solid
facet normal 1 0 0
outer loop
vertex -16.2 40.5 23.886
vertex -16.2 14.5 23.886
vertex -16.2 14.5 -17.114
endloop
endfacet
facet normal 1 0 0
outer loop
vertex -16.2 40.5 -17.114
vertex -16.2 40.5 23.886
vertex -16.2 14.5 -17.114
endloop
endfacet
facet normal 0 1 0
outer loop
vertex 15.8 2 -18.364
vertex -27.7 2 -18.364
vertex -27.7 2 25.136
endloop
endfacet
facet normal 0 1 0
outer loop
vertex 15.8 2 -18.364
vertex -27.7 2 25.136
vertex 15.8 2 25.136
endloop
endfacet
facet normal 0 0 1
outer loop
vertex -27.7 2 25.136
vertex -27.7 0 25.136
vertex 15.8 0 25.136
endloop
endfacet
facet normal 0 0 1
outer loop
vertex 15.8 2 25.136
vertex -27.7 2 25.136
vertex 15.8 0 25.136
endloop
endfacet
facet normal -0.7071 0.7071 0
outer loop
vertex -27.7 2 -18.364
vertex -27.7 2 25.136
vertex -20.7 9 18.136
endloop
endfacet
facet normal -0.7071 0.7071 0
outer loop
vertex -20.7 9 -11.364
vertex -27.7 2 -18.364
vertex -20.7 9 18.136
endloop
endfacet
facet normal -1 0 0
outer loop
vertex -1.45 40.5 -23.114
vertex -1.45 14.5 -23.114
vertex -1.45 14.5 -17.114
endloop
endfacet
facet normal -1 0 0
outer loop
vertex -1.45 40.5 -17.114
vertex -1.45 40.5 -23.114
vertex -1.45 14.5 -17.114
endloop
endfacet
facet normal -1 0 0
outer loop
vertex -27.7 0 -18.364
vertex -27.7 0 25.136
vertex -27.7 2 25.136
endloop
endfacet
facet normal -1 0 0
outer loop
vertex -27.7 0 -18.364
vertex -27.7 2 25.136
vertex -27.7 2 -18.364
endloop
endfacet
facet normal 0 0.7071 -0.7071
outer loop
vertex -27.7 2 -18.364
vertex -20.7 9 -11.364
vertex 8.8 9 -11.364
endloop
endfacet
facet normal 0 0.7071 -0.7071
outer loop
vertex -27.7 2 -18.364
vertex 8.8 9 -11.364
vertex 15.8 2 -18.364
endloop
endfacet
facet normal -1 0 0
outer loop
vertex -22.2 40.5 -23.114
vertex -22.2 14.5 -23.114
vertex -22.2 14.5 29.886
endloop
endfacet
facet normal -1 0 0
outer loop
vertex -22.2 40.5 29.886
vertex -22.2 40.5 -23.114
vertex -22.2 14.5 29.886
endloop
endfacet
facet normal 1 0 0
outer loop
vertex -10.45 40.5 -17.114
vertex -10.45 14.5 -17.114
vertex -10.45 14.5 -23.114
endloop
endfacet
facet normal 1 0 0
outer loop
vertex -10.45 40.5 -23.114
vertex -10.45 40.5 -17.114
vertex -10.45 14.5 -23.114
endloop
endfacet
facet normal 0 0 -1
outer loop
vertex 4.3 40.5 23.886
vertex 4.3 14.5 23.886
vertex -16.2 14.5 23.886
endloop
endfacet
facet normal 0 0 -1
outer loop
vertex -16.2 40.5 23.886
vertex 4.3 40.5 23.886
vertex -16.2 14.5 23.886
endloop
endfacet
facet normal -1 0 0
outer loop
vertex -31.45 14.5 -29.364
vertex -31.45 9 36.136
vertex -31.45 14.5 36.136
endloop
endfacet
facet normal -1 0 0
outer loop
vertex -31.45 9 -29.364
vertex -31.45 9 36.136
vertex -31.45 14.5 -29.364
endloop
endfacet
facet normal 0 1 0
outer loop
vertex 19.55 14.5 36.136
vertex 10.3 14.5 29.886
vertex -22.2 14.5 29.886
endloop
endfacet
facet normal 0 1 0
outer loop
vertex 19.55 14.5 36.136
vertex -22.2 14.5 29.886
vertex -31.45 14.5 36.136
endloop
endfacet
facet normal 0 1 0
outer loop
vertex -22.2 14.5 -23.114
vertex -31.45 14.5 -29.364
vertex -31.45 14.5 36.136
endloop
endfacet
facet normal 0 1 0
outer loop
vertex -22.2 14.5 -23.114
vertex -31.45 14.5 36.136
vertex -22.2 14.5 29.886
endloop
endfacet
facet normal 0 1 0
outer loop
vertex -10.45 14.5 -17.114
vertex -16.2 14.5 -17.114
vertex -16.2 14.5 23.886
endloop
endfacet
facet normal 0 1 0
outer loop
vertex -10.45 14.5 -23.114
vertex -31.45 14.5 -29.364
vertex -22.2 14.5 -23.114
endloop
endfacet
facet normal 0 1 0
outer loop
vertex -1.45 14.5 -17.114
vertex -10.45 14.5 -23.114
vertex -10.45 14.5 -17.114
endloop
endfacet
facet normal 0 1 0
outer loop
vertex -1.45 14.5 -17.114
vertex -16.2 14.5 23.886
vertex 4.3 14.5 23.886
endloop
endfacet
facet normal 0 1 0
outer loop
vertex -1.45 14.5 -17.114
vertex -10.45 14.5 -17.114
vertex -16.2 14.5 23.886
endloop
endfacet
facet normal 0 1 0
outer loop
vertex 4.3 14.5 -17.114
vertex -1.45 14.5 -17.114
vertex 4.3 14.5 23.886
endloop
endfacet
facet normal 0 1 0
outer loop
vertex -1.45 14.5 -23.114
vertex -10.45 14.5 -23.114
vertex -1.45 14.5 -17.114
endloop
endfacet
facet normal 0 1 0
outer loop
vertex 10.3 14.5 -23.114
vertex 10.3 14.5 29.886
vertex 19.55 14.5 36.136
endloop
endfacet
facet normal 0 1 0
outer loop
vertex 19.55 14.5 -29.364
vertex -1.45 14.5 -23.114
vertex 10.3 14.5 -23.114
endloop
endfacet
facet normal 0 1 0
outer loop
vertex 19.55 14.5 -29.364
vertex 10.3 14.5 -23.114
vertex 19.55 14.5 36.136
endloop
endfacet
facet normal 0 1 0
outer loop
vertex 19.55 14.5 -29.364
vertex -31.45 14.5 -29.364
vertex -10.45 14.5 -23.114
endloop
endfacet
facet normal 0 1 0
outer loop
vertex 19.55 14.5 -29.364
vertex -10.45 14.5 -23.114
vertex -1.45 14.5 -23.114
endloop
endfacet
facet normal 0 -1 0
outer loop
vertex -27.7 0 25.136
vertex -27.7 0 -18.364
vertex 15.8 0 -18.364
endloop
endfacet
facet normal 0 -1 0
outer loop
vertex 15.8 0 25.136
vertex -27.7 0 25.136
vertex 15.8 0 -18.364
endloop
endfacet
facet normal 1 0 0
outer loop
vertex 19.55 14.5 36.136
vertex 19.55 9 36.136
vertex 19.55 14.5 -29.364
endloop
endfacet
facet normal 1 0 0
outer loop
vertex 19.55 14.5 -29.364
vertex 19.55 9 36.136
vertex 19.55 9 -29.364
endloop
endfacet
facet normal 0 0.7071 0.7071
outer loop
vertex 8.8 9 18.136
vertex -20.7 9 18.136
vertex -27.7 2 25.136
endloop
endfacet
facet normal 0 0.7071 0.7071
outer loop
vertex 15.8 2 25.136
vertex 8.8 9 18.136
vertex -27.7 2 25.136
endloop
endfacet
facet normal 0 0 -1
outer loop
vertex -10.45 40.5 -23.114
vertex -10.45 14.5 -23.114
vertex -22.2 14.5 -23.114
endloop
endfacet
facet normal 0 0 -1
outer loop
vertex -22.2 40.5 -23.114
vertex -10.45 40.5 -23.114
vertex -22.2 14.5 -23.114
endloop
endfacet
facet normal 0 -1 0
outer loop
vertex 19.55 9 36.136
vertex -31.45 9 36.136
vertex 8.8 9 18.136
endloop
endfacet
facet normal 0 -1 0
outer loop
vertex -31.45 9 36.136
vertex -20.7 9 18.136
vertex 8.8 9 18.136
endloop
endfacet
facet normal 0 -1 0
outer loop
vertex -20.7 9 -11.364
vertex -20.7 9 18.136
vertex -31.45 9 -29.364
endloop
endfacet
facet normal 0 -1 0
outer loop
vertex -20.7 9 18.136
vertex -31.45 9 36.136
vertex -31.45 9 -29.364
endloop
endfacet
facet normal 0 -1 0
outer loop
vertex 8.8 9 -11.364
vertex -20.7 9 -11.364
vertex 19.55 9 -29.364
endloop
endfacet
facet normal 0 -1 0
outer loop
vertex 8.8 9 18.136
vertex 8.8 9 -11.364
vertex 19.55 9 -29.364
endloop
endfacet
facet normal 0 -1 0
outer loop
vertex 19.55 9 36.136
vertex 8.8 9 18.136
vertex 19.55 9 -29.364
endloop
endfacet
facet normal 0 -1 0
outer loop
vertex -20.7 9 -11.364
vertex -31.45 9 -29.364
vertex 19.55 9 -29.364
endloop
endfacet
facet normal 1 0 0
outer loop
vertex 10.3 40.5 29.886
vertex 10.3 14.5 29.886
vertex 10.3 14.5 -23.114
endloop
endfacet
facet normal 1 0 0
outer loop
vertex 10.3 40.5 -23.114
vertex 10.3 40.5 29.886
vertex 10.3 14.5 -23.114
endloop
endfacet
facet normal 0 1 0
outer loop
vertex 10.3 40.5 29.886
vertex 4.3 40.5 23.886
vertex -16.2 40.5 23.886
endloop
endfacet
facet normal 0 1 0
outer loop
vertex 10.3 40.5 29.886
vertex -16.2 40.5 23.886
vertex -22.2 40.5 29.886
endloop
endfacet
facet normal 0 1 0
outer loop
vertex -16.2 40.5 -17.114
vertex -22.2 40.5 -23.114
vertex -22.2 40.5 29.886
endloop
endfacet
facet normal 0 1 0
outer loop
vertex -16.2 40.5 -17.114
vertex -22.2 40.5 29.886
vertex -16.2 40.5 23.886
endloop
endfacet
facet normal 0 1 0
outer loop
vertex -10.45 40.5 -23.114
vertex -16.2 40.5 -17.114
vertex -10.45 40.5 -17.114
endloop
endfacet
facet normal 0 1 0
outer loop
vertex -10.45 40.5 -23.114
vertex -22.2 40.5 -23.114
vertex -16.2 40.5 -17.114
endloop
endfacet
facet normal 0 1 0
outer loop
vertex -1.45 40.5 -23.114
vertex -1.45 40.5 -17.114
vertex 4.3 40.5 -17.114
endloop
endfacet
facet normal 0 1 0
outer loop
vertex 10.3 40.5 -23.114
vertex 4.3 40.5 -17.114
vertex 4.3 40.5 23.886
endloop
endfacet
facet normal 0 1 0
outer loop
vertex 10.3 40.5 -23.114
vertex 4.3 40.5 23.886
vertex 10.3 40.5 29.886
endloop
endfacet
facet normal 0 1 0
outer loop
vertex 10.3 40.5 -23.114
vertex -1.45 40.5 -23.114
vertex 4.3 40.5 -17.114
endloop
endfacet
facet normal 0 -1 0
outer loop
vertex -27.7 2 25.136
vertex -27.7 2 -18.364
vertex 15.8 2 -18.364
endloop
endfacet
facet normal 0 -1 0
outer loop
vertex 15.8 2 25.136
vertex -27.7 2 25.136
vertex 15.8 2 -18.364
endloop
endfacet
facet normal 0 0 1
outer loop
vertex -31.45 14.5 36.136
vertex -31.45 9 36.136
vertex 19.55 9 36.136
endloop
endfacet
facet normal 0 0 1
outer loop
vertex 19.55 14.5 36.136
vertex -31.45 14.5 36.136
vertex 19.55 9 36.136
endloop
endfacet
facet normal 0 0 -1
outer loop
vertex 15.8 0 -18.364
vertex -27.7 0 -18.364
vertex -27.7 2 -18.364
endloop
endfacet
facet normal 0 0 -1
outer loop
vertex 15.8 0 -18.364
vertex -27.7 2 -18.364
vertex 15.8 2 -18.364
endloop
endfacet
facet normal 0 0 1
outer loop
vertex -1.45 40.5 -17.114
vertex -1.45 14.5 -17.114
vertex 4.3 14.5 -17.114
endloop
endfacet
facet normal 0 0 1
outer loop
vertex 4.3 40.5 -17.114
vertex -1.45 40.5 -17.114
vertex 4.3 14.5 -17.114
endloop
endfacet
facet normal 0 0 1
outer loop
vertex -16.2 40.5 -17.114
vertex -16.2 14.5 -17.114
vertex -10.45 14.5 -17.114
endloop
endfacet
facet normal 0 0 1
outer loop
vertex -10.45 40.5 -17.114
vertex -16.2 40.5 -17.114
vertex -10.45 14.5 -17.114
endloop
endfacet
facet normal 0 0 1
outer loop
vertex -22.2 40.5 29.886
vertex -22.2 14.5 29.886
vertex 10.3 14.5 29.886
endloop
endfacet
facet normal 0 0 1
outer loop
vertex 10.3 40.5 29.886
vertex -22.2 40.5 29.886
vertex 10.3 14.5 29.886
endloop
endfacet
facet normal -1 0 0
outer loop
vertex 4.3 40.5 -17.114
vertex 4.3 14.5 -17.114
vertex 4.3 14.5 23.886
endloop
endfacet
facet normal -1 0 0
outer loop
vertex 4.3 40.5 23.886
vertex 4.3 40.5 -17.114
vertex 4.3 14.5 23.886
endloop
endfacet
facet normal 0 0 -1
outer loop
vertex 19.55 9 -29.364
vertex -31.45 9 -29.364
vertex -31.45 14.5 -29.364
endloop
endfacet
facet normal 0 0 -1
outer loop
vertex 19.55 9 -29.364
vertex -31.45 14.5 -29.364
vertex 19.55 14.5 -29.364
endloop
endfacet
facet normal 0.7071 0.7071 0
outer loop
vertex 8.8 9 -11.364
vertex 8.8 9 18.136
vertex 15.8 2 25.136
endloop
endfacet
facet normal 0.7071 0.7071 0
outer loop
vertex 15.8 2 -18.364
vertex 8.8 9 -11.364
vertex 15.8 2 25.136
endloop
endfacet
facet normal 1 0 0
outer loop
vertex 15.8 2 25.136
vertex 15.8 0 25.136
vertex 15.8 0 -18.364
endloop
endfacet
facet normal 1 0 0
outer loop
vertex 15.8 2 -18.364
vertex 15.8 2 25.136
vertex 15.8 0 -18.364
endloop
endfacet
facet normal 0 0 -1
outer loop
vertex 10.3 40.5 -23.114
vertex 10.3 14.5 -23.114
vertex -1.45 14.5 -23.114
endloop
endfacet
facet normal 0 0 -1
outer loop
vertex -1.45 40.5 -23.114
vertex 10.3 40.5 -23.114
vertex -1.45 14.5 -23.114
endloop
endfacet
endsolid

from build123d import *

# Parameters (mm, degrees)
SKETCH1_W           = 43.5
SKETCH1_H           = 43.5
BOSS_EXTRUDE1_DEPTH = 2
SKETCH2_W           = 43.5
SKETCH2_H           = 43.5
BOSS_EXTRUDE3_DEPTH = 7
CUT_EXTRUDE1_DEPTH  = 53.350416735
CUT_EXTRUDE2_DEPTH  = 52.039681144
SKETCH7_W           = 51
SKETCH7_H           = 65.5
BOSS_EXTRUDE4_DEPTH = 5.5
BOSS_EXTRUDE5_DEPTH = 26


with BuildPart() as part:
    # Sketch1 → Boss-Extrude1 (new body)
    with BuildSketch(Plane(origin=(0, 0, 0), x_dir=(1, 0, 0), z_dir=(0, 1, 0))):
        with Locations((-5.950471698, -3.385613208)):
            Rectangle(SKETCH1_W, SKETCH1_H)
    extrude(amount=BOSS_EXTRUDE1_DEPTH)


with BuildPart() as body_2:
    # Sketch2 → Boss-Extrude3 (new body)
    with BuildSketch(Plane(origin=(0, 2, 0), x_dir=(1, 0, 0), z_dir=(0, 1, 0))):
        with Locations((-5.950471698, -3.385613208)):
            Rectangle(SKETCH2_W, SKETCH2_H)
    extrude(amount=BOSS_EXTRUDE3_DEPTH)

    # Sketch5 → Cut-Extrude1 (cut, through all)
    with BuildSketch(Plane.XY.offset(25.135613208)):
        Polygon((15.799528302, 9), (8.799528302, 9), (15.799528302, 2), align=None)
        Polygon((-27.700471698, 9), (-27.700471698, 2), (-20.700471698, 9), align=None)
    extrude(amount=-CUT_EXTRUDE1_DEPTH, mode=Mode.SUBTRACT)

    # Sketch6 → Cut-Extrude2 (cut, through all)
    with BuildSketch(Plane(origin=(15.799528302, 0, 0), x_dir=(0, 0, -1), z_dir=(1, 0, 0))):
        Polygon((-25.135613208, 2), (-25.135613208, 9), (-18.135613208, 9), align=None)
        Polygon((18.364386792, 2), (18.364386792, 9), (11.364386792, 9), align=None)
    extrude(amount=-CUT_EXTRUDE2_DEPTH, mode=Mode.SUBTRACT)

    # Sketch7 → Boss-Extrude4 (add)
    with BuildSketch(Plane(origin=(0, 9, 0), x_dir=(1, 0, 0), z_dir=(0, 1, 0))):
        with Locations((-5.950471698, -3.385613208)):
            Rectangle(SKETCH7_W, SKETCH7_H)
    extrude(amount=BOSS_EXTRUDE4_DEPTH)

    # Sketch9 → Boss-Extrude5 (add)
    with BuildSketch(Plane(origin=(0, 14.5, 0), x_dir=(1, 0, 0), z_dir=(0, 1, 0))):
        Polygon((-22.200471698, 23.114386792), (-22.200471698, -29.885613208), (10.299528302, -29.885613208), (10.299528302, 23.114386792), (-1.450471698, 23.114386792), (-1.450471698, 17.114386792), (4.299528302, 17.114386792), (4.299528302, -23.885613208), (-16.200471698, -23.885613208), (-16.200471698, 17.114386792), (-10.450471698, 17.114386792), (-10.450471698, 23.114386792), align=None)
    extrude(amount=BOSS_EXTRUDE5_DEPTH)


solid = Compound([part.part, body_2.part])
